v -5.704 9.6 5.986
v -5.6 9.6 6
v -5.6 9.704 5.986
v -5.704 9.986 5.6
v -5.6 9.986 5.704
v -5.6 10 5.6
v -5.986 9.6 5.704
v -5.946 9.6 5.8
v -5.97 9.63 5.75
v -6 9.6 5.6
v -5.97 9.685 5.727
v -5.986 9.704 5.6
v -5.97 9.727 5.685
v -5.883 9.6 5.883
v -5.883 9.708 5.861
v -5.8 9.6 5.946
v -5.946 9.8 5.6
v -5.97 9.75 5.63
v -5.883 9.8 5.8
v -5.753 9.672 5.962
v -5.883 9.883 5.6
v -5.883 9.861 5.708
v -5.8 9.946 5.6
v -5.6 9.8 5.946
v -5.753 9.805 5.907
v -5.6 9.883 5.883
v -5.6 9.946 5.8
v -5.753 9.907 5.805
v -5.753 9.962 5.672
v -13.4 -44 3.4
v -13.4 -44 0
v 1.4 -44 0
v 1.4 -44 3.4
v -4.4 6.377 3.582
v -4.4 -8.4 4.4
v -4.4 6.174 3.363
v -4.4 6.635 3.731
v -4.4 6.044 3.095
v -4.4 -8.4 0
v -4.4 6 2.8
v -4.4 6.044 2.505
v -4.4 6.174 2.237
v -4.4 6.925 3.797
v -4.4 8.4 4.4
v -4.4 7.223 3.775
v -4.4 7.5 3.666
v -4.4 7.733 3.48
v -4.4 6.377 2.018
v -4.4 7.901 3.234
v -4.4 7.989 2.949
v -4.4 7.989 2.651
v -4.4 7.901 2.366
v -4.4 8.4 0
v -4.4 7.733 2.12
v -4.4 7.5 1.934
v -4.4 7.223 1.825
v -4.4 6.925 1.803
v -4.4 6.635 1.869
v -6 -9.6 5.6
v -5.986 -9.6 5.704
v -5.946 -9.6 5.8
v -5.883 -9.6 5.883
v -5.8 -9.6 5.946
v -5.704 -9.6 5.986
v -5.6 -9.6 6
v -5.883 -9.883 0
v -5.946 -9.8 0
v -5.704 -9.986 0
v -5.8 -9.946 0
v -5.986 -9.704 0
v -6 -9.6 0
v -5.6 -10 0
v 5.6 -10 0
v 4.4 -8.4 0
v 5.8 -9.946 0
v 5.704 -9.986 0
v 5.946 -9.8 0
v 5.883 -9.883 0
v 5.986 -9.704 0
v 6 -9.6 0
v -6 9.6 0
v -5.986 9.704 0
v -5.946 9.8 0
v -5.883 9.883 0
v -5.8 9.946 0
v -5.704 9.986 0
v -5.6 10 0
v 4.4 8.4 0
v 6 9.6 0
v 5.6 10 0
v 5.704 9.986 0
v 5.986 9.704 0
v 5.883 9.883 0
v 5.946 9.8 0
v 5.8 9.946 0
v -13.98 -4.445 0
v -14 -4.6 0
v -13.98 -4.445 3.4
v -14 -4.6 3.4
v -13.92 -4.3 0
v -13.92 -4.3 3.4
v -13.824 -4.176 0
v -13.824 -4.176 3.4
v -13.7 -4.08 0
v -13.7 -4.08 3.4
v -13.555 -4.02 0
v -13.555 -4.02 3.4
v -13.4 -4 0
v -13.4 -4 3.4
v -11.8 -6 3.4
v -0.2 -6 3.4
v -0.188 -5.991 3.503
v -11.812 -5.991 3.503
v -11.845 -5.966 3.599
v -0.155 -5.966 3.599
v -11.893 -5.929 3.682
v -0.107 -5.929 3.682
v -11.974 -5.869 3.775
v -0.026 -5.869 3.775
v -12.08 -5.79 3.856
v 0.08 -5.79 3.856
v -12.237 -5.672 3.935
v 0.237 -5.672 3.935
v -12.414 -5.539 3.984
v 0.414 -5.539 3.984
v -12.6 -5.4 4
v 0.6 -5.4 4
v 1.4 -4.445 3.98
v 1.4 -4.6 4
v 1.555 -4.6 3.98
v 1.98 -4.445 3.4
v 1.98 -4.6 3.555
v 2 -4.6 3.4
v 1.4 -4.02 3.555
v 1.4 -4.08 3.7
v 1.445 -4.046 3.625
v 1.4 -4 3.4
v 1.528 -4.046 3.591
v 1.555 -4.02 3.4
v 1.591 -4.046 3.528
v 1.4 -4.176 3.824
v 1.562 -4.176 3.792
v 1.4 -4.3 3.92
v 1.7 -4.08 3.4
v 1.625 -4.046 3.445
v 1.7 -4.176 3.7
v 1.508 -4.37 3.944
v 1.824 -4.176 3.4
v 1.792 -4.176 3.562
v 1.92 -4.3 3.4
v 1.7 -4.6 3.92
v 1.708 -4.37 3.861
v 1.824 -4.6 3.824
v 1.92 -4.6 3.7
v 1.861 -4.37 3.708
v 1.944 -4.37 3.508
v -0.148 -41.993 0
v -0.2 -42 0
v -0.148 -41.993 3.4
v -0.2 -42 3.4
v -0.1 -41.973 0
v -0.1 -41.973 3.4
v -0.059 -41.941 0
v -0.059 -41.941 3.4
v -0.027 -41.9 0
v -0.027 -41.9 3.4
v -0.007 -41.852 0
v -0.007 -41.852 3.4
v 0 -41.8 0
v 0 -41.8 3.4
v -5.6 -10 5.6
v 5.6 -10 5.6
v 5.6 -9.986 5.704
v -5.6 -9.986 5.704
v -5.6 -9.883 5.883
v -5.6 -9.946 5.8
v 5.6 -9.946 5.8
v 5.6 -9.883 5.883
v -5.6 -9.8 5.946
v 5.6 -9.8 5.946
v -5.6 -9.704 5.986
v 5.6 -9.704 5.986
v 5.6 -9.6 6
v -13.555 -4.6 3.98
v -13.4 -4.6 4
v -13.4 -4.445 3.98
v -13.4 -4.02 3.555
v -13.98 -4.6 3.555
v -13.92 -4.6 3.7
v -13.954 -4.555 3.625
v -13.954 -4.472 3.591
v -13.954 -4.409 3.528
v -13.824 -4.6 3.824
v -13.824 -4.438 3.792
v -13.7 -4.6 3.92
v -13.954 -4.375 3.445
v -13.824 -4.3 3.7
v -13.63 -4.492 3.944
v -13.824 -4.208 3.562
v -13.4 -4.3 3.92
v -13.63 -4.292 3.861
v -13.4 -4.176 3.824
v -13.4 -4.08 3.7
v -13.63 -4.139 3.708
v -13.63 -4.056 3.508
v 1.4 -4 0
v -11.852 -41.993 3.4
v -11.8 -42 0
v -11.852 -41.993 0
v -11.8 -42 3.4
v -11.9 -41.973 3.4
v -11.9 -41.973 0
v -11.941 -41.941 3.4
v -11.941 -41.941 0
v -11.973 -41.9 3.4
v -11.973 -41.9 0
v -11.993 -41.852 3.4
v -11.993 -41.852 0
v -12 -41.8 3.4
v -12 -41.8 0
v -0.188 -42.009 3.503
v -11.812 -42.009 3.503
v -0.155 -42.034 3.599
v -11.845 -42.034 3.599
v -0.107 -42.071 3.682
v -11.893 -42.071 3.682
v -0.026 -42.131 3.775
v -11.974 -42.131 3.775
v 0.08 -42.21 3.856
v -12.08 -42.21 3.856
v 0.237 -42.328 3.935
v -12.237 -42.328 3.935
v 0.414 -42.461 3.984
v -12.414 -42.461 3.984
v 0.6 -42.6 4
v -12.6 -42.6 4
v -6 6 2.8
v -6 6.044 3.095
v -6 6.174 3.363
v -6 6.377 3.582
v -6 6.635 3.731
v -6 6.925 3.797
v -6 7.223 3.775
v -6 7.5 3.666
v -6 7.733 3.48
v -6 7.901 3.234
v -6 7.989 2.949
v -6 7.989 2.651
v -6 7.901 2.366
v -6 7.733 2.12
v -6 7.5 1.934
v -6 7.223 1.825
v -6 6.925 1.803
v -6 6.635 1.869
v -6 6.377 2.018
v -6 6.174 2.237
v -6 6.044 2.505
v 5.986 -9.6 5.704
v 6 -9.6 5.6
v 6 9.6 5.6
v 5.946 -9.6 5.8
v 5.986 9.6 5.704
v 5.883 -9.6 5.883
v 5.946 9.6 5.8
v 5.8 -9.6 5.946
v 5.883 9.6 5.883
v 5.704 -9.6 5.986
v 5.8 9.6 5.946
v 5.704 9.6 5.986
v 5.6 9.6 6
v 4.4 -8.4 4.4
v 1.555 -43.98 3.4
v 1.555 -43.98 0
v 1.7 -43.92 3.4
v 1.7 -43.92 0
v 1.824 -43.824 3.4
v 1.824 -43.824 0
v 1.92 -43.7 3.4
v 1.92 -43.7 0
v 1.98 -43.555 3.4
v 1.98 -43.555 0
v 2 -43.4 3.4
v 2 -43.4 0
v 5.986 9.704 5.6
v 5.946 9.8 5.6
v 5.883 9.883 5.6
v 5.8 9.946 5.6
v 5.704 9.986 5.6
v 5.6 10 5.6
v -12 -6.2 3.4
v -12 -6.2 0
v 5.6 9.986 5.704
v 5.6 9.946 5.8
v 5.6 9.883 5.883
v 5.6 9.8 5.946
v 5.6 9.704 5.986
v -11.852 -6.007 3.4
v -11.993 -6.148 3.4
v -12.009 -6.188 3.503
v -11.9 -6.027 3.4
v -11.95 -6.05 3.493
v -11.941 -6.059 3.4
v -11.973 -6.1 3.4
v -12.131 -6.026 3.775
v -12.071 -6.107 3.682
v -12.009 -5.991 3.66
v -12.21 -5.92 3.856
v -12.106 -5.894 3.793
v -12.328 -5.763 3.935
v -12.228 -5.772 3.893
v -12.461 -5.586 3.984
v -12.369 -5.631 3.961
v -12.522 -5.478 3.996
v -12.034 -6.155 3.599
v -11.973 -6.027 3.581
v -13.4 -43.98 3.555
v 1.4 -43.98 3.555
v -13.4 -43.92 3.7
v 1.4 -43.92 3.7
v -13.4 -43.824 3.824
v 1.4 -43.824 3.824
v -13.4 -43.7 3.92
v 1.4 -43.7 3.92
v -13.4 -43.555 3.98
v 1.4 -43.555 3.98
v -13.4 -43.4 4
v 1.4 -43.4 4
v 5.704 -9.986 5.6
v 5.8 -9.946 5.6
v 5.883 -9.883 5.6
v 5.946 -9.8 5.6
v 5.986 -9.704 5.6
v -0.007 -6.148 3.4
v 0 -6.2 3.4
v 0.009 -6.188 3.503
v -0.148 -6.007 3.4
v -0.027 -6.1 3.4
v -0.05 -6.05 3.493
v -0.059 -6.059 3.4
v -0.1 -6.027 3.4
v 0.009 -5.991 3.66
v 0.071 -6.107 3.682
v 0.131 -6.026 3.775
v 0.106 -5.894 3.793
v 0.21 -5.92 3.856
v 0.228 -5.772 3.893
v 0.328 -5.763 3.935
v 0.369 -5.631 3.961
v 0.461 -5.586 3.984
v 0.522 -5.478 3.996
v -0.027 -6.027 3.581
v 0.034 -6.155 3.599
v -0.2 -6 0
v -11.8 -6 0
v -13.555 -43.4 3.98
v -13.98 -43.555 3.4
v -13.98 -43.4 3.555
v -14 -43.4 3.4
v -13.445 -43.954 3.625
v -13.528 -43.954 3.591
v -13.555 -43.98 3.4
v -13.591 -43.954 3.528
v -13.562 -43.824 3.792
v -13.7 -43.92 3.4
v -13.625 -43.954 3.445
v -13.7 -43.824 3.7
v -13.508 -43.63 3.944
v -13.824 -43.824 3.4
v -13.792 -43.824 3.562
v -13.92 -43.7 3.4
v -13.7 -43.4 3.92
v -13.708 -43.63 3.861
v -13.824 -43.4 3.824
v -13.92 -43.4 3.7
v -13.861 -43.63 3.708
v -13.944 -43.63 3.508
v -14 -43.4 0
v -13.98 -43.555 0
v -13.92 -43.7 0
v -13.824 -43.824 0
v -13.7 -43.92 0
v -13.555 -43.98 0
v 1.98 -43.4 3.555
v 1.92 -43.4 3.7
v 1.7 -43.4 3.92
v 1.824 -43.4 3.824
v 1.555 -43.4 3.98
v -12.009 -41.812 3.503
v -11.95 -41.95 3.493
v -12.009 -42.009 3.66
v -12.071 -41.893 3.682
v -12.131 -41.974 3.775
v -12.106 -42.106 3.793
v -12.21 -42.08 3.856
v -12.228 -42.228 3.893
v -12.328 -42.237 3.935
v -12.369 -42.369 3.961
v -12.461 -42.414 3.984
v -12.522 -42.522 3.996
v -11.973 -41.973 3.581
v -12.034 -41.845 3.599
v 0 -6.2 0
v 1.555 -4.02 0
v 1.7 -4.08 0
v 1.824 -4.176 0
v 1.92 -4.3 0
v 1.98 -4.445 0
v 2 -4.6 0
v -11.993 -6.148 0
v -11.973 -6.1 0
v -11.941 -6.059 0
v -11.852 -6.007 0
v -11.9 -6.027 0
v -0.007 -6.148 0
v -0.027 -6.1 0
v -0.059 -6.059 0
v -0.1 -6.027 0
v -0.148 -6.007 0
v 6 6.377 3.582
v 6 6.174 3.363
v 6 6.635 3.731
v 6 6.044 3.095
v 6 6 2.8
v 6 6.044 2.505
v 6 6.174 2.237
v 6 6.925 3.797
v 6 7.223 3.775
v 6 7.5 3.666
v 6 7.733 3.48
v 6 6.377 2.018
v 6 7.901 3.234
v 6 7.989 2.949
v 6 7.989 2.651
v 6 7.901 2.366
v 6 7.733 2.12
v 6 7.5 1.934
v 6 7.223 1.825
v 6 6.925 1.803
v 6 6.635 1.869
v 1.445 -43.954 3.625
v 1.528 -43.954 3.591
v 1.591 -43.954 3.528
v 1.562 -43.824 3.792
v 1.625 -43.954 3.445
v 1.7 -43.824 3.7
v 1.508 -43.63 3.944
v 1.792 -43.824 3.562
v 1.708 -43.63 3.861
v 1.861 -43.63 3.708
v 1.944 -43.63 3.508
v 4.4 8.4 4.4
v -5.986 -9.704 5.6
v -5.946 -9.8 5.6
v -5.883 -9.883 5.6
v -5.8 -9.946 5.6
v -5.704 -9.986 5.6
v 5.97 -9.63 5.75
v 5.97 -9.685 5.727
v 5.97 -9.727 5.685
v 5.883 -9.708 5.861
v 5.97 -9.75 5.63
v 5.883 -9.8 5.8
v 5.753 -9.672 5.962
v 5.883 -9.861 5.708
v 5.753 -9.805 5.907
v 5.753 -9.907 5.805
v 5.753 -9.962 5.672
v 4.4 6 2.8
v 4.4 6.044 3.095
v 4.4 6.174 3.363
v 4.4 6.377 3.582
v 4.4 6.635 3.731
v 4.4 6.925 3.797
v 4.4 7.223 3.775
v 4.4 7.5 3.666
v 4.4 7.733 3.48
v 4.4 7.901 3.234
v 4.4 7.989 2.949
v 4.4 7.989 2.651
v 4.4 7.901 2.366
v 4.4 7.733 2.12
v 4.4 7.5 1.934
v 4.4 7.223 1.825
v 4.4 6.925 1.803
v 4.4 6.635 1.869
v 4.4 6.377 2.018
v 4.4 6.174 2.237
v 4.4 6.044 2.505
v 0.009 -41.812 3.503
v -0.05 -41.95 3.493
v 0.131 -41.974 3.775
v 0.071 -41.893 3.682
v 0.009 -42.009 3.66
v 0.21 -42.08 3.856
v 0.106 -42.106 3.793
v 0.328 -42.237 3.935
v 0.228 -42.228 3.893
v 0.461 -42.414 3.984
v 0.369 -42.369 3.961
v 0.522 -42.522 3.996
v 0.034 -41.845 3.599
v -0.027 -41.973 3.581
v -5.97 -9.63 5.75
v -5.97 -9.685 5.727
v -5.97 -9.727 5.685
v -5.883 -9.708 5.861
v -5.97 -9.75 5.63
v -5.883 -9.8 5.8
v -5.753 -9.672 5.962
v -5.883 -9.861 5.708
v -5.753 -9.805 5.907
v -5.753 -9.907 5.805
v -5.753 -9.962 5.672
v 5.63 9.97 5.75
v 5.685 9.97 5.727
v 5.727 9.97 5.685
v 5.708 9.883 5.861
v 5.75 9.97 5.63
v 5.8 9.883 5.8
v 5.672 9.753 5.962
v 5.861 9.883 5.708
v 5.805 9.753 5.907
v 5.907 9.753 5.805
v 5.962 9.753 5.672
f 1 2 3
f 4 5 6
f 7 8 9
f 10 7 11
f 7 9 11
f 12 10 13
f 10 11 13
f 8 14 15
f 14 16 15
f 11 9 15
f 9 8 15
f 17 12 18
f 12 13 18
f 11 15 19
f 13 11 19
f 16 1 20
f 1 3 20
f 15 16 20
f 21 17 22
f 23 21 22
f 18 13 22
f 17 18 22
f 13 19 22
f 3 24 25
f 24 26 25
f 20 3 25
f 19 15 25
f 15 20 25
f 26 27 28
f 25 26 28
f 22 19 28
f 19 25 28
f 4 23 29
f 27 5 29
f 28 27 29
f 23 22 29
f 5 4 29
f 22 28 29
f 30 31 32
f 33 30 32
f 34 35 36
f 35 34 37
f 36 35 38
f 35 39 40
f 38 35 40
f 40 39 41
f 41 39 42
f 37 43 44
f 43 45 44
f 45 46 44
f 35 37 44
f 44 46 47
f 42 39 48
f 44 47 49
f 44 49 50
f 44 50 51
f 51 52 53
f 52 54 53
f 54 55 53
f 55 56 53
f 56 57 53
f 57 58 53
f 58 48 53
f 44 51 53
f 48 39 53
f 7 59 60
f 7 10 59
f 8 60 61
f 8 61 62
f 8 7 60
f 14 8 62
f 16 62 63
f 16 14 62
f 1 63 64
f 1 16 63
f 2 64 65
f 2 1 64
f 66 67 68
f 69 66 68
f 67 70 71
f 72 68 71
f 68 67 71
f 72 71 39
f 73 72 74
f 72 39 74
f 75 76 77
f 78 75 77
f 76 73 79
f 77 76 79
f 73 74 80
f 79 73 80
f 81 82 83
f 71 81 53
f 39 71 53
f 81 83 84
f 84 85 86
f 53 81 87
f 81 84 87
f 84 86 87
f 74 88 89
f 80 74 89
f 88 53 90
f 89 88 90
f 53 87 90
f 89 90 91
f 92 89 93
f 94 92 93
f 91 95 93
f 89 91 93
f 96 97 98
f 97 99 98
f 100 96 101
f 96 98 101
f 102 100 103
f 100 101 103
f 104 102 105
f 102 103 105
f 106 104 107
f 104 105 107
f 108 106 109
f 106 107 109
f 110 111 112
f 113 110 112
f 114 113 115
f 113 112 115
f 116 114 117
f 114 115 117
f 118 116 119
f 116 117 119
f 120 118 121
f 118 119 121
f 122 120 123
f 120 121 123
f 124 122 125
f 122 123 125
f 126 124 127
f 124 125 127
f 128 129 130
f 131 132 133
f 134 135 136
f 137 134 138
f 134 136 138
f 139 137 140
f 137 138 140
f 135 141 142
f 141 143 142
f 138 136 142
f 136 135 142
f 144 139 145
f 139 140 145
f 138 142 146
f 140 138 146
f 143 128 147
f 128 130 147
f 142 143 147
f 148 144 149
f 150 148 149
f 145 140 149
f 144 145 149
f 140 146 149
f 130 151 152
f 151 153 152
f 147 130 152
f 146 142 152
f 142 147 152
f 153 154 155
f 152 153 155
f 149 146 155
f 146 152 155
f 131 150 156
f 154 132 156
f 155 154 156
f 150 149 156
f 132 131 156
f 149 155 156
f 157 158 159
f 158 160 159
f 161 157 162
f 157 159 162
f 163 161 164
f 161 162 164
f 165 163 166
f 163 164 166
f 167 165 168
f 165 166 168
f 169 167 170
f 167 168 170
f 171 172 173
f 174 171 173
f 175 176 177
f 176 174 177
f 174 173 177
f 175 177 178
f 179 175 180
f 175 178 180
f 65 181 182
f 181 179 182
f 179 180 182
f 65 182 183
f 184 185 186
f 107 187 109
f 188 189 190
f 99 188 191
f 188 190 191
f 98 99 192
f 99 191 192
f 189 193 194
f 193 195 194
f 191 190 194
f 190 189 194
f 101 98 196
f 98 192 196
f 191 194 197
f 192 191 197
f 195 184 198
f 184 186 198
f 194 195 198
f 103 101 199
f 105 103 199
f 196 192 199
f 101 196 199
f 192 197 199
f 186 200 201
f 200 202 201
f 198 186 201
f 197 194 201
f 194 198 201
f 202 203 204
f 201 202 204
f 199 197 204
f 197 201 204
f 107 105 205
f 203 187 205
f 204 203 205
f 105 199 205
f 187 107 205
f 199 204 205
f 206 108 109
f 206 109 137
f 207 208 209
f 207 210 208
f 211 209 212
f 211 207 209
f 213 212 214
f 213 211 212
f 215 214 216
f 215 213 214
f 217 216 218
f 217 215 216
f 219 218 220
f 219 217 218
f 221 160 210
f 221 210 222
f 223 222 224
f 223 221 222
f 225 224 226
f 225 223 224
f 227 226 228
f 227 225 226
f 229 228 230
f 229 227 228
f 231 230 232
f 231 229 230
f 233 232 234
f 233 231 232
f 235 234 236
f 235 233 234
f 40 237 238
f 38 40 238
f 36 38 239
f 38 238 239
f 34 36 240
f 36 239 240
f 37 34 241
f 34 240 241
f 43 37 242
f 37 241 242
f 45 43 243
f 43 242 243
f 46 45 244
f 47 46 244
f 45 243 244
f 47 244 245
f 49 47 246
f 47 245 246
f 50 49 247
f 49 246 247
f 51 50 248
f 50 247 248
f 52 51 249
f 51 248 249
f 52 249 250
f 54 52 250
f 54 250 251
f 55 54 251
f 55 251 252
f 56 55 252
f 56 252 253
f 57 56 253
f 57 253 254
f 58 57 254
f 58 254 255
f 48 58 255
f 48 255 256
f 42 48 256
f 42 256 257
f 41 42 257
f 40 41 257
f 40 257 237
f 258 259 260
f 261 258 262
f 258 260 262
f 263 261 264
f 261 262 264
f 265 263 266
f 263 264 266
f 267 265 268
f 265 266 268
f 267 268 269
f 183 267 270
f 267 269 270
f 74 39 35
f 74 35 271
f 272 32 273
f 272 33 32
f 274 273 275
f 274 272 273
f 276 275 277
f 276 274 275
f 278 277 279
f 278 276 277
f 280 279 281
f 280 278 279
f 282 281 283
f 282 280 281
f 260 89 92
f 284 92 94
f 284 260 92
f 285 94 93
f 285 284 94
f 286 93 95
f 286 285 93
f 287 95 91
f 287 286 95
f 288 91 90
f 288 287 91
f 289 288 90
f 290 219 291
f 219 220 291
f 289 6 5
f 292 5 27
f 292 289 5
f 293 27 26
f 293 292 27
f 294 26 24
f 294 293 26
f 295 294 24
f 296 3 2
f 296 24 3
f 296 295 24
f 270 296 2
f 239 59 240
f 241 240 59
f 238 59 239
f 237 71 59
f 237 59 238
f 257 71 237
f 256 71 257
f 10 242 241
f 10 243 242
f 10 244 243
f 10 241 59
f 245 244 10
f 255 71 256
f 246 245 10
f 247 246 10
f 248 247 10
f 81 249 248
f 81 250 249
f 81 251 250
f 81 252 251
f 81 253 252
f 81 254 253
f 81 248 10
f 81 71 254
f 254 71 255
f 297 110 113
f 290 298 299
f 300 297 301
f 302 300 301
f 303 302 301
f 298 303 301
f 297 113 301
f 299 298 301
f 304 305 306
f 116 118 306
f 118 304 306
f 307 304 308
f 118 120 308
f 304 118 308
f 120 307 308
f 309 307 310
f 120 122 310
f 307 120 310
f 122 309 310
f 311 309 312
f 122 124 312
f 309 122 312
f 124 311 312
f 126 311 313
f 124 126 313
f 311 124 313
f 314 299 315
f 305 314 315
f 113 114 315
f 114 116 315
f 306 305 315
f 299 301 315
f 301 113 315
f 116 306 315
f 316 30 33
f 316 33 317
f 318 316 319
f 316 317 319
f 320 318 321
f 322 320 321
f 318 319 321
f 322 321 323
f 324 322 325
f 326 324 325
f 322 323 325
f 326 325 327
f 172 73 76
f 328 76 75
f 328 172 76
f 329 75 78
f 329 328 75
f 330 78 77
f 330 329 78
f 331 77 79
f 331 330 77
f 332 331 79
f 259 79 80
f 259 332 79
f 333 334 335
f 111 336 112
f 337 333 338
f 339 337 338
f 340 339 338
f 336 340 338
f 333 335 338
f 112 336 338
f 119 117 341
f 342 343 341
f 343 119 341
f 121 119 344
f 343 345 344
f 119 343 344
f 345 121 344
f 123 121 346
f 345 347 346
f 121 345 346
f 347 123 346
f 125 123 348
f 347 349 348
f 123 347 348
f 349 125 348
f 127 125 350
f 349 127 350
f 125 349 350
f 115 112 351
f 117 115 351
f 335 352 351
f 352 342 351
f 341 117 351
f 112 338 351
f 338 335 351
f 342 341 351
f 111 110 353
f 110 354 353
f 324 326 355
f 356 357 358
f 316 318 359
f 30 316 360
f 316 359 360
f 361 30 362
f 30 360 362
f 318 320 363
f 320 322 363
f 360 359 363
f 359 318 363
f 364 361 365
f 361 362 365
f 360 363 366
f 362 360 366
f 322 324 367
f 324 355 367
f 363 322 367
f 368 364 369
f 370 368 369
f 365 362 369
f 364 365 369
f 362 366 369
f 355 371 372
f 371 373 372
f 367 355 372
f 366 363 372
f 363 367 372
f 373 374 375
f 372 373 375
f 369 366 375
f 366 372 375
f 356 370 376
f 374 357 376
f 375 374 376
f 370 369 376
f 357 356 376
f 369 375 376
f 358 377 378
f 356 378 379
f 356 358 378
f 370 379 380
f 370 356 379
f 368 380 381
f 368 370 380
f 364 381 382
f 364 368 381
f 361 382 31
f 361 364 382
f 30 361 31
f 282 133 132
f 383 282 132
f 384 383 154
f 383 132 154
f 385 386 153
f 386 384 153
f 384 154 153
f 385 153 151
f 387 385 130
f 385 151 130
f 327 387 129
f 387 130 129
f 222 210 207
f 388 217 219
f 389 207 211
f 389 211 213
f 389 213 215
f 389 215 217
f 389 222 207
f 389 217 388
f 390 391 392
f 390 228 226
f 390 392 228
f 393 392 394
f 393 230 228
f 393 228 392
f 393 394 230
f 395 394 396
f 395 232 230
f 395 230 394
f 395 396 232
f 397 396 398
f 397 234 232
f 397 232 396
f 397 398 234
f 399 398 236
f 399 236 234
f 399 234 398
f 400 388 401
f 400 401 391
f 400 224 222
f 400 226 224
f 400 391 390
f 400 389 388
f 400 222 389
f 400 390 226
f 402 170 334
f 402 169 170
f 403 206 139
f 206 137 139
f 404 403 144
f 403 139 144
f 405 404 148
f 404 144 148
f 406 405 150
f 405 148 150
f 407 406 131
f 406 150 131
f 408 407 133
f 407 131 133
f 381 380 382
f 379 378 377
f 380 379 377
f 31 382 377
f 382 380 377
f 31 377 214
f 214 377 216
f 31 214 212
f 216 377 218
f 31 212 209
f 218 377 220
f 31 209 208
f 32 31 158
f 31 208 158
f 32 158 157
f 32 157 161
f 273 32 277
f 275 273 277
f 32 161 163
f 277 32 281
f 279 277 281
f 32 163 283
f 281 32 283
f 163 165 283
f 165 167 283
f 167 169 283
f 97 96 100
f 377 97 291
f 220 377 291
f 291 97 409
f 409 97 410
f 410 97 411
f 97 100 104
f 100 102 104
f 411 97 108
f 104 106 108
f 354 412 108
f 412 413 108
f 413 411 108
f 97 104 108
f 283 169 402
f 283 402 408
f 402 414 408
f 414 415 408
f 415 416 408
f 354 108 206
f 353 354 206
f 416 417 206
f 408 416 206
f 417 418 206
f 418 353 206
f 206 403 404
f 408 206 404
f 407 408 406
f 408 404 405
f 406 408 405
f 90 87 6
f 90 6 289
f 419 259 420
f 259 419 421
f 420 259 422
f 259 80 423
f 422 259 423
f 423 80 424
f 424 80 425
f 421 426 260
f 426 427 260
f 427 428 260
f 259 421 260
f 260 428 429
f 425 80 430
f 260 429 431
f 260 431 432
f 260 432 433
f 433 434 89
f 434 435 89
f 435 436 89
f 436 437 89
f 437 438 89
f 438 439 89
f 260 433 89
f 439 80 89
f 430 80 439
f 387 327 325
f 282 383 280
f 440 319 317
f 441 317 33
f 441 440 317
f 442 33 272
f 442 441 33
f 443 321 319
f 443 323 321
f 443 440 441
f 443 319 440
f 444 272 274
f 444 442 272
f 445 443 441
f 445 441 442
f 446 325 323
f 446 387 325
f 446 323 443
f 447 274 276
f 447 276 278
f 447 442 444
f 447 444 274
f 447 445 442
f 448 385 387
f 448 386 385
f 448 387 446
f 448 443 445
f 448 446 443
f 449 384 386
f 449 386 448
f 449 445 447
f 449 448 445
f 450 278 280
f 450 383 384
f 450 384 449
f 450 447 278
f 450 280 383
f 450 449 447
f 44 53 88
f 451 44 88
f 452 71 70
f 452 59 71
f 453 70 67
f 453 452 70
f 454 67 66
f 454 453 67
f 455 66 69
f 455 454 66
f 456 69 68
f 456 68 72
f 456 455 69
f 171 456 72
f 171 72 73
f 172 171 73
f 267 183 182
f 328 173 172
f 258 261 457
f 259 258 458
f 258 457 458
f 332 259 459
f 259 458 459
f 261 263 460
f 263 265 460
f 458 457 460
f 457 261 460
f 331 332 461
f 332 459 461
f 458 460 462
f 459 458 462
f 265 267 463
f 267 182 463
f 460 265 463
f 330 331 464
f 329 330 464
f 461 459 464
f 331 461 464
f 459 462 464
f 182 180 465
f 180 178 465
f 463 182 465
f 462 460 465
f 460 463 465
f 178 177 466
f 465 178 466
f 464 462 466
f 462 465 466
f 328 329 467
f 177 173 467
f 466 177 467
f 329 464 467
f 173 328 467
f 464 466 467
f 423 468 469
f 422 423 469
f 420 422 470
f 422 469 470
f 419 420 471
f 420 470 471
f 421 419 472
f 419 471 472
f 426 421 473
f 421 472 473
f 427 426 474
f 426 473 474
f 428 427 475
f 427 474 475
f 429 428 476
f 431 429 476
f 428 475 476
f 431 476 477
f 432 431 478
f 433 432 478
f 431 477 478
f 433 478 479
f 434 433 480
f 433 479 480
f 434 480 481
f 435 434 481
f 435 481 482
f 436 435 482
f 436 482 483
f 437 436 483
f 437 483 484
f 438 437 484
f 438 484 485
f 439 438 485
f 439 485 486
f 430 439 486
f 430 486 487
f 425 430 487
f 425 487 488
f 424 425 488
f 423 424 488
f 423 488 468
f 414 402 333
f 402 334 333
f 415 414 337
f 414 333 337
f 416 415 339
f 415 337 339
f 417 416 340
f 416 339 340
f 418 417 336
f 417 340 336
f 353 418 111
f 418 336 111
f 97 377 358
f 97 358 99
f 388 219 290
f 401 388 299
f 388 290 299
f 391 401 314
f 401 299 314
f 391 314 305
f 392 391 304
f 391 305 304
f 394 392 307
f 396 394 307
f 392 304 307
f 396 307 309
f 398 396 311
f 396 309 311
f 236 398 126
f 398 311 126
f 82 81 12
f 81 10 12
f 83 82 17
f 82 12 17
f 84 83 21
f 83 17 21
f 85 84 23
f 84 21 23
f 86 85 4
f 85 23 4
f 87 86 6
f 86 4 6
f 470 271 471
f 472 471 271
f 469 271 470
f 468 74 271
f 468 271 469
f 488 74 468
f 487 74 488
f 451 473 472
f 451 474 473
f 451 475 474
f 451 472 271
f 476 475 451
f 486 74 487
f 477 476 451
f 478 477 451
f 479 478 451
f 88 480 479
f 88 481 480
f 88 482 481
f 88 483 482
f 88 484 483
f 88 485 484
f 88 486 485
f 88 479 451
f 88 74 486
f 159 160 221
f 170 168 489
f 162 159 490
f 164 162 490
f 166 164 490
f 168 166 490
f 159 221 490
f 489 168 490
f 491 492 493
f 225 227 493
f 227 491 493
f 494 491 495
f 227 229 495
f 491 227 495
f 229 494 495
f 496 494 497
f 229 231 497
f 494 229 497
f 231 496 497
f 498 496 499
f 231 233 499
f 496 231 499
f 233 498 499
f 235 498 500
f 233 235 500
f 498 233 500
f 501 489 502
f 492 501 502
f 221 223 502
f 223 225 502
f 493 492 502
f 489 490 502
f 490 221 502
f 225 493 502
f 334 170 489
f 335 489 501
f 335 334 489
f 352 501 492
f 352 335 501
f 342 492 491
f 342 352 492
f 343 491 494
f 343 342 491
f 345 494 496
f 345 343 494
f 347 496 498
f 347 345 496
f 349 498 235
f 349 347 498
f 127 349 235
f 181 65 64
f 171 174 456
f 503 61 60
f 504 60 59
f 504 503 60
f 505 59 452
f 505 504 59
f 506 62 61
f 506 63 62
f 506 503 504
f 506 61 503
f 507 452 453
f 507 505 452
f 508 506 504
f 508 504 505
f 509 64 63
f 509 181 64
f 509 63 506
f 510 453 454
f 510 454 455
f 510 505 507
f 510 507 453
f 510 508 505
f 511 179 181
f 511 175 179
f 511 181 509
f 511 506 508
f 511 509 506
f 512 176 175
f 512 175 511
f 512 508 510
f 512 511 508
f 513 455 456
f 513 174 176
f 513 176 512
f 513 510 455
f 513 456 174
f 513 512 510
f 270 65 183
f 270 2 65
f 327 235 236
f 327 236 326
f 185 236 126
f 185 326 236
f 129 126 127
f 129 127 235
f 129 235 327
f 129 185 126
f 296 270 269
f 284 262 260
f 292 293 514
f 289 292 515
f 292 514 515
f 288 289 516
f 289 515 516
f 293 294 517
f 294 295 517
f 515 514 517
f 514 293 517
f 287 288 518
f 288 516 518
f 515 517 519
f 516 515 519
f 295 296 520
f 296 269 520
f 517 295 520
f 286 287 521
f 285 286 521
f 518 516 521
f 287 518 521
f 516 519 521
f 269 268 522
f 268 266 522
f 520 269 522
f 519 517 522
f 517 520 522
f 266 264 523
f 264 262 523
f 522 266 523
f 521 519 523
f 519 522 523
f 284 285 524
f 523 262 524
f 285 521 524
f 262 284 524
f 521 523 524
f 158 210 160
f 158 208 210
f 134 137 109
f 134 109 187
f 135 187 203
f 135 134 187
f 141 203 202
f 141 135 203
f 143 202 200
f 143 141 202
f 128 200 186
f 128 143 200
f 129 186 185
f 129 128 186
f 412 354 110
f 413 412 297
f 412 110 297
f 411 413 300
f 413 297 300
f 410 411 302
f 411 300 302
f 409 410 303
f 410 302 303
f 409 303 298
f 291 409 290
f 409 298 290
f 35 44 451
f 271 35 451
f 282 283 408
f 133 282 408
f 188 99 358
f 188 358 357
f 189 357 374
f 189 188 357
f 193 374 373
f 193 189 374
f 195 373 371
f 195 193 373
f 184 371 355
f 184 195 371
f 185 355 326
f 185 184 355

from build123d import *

# Parameters (mm, degrees)
F0_W     = 12
F0_H     = 20
F1_DEPTH = 6
F2_T     = -1.6
F3_W     = 16
F3_H     = 40
F3_W_2   = 12
F3_H_2   = 36
F4_DEPTH = 4
F5_R     = 0.4
F6_R     = 0.6
F7_R     = 0.2
F8_R     = 1
F9_DEPTH = 25


with BuildPart() as f1:
    # F0 (on Top) → F1 (new body)
    with BuildSketch(Plane.XY):
        Rectangle(F0_W, F0_H)
    extrude(amount=F1_DEPTH)

    # F2
    f2_openings = [f1.faces().sort_by_distance(p)[0] for p in [
        (0, 0, 0),
    ]]
    offset(amount=F2_T, openings=f2_openings)

    # F5
    f5_edges = [f1.edges().sort_by_distance(p)[0] for p in [
        (0, -10, 6),
        (6, 0, 6),
        (0, 10, 6),
        (-6, 0, 6),
        (-6, 10, 3),
        (-6, -10, 3),
        (6, -10, 3),
        (6, 10, 3),
    ]]
    fillet(f5_edges, radius=F5_R)

    # F8 (on face) → F9 (cut)
    with BuildSketch(Plane(origin=(-6, 0, 0), x_dir=(0, -1, 0), z_dir=(-1, 0, 0))):
        with Locations((-7, 2.8)):
            Circle(F8_R)
    extrude(amount=-F9_DEPTH, mode=Mode.SUBTRACT)


with BuildPart() as f4:
    # F3 (on Top) → F4 (new body)
    with BuildSketch(Plane.XY):
        with Locations((-6, -24)):
            Rectangle(F3_W, F3_H)
        with Locations((-6, -24)):
            Rectangle(F3_W_2, F3_H_2, mode=Mode.SUBTRACT)
    extrude(amount=F4_DEPTH)

    # F6
    f6_edges = [f4.edges().sort_by_distance(p)[0] for p in [
        (2, -24, 4),
        (-6, -4, 4),
        (-14, -24, 4),
        (-6, -44, 4),
        (-6, -6, 4),
        (0, -24, 4),
        (-6, -42, 4),
        (-12, -24, 4),
        (-14, -4, 2),
        (2, -4, 2),
        (2, -44, 2),
        (-14, -44, 2),
    ]]
    fillet(f6_edges, radius=F6_R)

    # F7
    f7_edges = [f4.edges().sort_by_distance(p)[0] for p in [
        (-12, -6, 1.7),
        (0, -6, 1.7),
        (-12, -42, 1.7),
        (0, -42, 1.7),
    ]]
    fillet(f7_edges, radius=F7_R)


solid = Compound([f1.part, f4.part])
